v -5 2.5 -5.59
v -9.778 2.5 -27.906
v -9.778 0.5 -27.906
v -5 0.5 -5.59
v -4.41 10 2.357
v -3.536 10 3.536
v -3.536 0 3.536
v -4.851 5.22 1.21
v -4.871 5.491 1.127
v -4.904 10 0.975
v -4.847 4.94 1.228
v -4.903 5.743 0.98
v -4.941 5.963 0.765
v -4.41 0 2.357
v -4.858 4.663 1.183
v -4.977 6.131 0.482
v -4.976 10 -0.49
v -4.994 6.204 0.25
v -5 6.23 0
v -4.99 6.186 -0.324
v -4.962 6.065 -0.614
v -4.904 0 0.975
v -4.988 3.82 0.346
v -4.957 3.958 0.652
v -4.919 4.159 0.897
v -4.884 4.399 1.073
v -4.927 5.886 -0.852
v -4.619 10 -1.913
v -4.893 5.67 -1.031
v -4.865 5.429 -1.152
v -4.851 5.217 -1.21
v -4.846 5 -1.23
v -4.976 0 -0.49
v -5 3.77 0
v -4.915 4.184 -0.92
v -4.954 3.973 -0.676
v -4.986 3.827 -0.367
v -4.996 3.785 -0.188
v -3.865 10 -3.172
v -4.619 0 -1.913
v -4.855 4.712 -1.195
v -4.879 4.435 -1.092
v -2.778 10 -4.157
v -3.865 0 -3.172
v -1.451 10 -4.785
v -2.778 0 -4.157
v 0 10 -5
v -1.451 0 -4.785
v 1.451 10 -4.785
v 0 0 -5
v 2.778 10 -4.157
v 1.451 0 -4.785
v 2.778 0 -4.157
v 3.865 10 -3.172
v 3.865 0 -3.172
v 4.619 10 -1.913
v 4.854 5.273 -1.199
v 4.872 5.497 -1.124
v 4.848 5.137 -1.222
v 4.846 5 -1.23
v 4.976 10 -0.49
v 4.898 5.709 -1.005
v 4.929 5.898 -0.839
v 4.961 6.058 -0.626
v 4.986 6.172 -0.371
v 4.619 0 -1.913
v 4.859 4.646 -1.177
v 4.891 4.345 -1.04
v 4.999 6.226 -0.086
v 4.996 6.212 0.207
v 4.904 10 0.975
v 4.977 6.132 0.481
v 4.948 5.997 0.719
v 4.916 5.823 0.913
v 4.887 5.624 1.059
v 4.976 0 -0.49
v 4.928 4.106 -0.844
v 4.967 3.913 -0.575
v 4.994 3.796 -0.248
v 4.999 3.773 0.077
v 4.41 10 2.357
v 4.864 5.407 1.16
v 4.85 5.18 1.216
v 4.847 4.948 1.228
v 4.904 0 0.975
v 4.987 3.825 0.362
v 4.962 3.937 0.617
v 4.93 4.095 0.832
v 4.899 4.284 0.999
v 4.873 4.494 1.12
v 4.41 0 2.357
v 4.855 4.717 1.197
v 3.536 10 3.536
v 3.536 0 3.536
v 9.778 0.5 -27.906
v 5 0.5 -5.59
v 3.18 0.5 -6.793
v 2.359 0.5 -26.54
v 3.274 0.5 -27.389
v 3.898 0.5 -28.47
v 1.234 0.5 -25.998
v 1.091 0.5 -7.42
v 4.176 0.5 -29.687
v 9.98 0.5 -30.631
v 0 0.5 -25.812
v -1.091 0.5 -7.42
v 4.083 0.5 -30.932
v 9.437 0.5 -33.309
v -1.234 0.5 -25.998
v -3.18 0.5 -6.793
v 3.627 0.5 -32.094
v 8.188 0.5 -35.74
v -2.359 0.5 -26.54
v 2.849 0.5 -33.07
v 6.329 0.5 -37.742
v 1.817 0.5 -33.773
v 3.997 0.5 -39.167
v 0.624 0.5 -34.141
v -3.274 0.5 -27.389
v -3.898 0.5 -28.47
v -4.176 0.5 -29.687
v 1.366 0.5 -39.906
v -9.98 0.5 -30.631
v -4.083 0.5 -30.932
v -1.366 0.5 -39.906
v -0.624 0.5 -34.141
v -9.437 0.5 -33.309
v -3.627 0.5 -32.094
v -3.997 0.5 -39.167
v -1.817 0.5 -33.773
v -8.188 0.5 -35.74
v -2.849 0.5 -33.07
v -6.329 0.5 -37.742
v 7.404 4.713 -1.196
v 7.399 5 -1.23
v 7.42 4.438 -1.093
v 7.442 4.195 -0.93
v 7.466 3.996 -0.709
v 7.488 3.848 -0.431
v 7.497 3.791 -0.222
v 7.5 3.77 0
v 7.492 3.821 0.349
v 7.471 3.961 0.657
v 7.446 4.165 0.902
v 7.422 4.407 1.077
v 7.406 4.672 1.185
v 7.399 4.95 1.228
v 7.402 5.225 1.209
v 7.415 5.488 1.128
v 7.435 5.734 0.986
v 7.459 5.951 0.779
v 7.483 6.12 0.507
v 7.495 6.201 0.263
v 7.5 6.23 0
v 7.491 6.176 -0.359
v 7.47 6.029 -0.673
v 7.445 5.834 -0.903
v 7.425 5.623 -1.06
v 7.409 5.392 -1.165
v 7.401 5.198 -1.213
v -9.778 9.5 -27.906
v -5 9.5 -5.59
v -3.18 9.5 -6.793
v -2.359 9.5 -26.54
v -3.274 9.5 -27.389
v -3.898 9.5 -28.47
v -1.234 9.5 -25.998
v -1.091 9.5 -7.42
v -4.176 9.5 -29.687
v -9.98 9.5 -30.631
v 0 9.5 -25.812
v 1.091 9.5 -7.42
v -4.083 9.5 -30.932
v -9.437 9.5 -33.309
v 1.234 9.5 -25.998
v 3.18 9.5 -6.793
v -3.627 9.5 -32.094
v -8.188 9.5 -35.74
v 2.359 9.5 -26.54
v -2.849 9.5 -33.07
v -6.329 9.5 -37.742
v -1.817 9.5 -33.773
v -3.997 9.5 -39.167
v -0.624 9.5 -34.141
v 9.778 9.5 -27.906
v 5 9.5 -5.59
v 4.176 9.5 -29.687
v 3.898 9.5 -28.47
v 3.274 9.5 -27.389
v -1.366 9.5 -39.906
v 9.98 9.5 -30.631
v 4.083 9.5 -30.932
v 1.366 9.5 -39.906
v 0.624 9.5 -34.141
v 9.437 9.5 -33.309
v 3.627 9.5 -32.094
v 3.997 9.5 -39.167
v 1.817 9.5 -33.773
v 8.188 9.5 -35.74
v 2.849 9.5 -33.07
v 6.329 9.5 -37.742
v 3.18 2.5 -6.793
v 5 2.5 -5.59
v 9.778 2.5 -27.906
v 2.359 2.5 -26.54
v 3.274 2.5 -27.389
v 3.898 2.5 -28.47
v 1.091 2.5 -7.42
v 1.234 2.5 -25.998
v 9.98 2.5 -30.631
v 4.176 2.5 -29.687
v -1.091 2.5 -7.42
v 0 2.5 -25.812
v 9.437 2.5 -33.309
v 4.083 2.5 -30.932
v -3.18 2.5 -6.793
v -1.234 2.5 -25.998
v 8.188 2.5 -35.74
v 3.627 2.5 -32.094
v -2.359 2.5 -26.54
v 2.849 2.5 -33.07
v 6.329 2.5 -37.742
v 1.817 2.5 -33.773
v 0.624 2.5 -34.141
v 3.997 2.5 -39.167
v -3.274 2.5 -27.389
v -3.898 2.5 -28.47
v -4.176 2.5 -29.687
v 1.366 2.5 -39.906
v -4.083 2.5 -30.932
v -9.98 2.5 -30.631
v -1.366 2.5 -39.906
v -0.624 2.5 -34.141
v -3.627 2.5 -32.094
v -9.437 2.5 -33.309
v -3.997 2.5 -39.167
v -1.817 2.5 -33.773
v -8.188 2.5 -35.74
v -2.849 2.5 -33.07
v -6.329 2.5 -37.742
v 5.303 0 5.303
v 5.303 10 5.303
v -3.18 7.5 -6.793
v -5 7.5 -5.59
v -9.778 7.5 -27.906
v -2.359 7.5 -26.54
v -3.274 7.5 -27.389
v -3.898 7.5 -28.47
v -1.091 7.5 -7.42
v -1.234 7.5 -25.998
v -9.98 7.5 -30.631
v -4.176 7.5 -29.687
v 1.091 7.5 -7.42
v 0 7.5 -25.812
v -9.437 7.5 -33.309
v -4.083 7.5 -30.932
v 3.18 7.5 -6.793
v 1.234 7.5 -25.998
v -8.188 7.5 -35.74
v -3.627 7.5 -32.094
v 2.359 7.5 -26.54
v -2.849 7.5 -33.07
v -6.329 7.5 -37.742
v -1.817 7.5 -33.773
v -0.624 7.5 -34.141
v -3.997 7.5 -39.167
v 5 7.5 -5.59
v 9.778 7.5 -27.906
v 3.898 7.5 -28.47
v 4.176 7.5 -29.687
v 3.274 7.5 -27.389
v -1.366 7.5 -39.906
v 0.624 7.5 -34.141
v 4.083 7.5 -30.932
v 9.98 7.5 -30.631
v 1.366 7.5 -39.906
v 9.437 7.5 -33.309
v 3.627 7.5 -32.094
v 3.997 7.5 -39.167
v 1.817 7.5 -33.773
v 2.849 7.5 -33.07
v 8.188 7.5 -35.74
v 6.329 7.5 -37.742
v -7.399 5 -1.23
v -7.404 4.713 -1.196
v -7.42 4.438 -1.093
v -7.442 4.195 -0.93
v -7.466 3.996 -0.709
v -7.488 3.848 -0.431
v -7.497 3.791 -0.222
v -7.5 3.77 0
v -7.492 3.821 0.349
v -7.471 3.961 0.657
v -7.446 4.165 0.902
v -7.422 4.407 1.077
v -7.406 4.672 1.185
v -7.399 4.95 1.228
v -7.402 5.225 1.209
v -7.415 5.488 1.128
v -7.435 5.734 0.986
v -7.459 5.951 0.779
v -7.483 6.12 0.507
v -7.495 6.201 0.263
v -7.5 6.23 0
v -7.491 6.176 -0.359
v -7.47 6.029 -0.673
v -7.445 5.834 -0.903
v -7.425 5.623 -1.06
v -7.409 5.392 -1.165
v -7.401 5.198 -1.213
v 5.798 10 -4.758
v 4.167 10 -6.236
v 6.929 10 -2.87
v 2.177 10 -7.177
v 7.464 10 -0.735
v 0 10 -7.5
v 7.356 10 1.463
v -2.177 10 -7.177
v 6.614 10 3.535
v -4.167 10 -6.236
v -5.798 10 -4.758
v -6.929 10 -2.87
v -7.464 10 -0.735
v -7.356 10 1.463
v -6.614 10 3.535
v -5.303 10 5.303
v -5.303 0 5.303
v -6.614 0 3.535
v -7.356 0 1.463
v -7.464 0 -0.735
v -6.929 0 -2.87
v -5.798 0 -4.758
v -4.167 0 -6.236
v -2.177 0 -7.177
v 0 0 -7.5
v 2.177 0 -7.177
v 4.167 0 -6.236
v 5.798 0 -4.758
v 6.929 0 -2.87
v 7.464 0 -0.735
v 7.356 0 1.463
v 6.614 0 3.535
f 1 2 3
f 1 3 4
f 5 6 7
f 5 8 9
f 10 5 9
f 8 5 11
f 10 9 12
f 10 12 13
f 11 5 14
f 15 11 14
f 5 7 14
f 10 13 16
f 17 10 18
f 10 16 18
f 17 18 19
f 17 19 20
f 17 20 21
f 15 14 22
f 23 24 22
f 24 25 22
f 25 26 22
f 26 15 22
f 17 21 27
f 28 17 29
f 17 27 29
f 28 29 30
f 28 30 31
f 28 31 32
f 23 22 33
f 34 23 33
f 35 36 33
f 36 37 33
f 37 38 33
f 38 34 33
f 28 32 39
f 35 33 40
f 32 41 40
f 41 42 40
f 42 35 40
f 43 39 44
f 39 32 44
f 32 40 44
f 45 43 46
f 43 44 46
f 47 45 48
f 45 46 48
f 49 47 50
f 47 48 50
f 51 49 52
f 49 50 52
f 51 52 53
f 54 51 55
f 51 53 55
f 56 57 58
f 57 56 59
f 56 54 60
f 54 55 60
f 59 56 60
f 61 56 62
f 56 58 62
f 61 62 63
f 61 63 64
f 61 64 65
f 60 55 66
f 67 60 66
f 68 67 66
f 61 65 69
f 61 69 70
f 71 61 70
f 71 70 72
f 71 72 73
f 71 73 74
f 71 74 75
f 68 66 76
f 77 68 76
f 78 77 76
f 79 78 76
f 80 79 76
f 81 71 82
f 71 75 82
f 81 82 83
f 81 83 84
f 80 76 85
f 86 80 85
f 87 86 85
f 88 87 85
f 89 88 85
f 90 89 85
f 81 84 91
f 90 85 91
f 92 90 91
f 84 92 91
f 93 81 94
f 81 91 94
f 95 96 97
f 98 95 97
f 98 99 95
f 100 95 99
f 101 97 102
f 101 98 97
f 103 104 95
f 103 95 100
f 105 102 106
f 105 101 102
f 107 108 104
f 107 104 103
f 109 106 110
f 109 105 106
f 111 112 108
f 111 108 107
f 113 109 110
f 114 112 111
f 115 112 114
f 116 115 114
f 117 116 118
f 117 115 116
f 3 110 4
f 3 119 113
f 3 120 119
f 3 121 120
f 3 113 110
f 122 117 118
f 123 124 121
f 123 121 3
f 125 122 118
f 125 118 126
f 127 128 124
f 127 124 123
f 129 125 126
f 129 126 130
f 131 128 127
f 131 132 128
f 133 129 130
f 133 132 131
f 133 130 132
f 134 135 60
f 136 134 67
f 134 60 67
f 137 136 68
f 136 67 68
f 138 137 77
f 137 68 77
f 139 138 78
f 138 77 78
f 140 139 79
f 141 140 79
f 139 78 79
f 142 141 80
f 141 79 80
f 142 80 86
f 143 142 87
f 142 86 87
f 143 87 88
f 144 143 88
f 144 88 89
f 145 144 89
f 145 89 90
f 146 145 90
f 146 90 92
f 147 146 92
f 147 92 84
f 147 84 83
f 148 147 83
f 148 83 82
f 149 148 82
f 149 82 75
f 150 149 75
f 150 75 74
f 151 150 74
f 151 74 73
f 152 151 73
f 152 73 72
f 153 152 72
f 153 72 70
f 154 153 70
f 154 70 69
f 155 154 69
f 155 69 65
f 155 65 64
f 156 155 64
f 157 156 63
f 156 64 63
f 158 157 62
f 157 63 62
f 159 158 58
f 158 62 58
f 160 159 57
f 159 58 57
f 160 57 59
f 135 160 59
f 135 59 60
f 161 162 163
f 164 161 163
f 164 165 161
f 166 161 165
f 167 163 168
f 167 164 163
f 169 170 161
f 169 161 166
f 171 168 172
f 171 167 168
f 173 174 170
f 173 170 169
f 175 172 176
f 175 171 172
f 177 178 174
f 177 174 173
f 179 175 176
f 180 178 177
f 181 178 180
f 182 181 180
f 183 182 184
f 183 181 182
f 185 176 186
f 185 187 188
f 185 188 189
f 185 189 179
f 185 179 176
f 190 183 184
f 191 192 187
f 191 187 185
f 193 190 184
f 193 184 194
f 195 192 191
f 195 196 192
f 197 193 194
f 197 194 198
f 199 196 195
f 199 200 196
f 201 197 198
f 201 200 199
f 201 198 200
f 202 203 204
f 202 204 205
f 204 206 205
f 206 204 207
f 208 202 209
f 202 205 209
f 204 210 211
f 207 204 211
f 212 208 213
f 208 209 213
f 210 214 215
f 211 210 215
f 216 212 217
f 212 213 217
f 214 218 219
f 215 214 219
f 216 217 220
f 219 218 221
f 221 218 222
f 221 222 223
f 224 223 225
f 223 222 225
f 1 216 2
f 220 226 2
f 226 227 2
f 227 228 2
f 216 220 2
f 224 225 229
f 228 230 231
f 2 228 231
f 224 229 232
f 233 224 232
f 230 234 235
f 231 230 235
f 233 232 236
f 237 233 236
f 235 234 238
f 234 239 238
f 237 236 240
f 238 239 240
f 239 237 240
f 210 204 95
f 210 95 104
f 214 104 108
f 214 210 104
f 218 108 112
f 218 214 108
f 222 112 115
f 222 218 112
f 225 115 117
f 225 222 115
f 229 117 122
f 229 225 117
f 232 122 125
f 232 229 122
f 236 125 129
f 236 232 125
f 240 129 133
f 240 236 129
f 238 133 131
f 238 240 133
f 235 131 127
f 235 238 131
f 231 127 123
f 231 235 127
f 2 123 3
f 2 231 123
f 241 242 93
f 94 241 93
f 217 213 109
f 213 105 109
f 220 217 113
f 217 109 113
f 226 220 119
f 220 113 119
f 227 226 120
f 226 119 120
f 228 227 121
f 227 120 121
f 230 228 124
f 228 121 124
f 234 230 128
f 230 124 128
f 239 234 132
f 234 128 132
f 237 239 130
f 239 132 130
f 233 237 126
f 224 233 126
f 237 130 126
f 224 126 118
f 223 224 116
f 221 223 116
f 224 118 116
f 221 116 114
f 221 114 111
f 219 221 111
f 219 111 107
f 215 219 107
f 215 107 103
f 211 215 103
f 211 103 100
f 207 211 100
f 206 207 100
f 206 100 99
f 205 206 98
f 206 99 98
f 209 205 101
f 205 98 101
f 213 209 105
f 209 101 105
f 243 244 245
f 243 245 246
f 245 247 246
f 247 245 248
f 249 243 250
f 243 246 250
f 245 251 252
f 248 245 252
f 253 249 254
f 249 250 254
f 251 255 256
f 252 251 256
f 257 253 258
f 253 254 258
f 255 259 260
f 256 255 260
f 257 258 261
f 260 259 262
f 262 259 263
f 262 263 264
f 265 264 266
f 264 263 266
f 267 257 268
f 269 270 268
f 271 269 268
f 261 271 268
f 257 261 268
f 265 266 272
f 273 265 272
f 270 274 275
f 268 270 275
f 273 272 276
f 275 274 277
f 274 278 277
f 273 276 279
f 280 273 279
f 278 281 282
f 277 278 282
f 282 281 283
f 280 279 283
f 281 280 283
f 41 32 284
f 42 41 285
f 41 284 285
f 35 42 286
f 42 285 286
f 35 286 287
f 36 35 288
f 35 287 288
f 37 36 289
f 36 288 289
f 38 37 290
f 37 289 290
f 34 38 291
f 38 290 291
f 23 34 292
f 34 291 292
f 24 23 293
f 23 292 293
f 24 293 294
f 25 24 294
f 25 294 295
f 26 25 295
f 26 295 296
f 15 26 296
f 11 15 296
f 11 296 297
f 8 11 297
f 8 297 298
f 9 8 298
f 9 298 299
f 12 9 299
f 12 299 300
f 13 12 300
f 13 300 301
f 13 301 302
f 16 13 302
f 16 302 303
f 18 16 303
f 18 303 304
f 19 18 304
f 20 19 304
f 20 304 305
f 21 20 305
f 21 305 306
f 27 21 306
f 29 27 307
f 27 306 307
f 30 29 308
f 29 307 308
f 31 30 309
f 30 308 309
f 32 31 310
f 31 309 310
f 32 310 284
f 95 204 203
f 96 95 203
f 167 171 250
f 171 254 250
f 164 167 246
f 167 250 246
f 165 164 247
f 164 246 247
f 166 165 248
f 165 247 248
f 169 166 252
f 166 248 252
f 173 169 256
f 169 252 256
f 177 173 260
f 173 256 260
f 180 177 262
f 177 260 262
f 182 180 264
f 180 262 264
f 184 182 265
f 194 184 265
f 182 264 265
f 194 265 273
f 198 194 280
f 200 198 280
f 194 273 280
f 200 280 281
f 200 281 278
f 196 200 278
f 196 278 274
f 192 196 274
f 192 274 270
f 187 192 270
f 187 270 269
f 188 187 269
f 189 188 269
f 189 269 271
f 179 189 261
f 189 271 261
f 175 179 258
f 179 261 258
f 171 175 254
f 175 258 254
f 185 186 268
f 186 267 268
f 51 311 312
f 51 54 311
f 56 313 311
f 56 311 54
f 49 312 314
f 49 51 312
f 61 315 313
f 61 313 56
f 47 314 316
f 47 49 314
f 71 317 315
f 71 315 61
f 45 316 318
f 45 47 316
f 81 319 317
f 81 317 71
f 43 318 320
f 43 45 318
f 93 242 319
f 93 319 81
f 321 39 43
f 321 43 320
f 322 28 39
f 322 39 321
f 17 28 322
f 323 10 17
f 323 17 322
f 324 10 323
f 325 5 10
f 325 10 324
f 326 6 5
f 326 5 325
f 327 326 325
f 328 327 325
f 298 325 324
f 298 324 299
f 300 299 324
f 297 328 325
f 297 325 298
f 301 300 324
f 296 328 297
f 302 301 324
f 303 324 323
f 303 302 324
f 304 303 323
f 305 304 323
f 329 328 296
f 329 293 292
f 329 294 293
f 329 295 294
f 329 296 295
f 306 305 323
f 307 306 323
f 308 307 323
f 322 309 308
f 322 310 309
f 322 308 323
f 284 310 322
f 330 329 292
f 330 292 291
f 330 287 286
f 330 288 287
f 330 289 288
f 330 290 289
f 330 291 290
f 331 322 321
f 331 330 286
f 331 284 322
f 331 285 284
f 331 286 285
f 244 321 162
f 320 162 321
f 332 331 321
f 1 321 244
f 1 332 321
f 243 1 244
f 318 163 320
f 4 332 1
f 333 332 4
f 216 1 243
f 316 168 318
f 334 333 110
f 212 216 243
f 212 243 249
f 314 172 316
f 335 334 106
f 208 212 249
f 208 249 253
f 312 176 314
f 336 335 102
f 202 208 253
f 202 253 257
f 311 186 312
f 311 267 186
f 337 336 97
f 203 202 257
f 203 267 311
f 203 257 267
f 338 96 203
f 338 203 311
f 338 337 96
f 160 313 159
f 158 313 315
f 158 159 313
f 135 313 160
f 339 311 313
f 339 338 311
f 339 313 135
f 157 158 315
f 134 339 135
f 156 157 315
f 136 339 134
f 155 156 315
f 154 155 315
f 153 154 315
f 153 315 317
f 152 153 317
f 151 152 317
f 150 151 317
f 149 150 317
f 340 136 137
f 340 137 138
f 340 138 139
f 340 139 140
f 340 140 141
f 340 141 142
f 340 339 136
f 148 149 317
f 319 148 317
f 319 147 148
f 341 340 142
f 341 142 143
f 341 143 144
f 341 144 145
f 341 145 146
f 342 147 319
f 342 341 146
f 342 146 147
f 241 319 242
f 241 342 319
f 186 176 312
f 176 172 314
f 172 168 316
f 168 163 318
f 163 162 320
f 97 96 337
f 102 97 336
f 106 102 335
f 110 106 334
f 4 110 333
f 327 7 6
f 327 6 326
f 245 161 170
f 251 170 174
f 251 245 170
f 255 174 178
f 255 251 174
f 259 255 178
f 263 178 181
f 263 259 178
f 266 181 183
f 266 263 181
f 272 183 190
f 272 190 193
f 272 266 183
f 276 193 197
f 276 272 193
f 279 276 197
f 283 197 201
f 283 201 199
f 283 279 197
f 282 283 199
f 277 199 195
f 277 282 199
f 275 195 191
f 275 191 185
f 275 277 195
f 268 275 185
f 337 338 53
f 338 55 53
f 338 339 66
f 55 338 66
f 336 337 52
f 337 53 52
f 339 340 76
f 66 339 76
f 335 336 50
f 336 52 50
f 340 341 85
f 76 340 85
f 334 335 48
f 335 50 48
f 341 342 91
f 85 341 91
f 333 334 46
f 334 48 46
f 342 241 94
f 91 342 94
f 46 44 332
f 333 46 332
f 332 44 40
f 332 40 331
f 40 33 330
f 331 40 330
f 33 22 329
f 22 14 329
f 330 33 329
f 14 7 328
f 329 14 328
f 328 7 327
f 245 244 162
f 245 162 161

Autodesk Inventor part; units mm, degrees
sketch "Sketch1" plane through (0, 0, 0) normal (0, 1, 0) x (-1, 0, 0)
  circle A0 centre (0, 0) radius 5
  circle A1 centre (0, 0) radius 7.5
  dimension "d0" = 10
  dimension "d1" = 15
extrude "Extrusion1" add sketch "Sketch1" along normal blind 10
ref_plane "Work Plane1" through (0, 7.5, 0) normal (0, 1, 0) x (1, 0, 0)
sketch "Sketch2" plane through (0, 7.5, 0) normal (0, 1, 0) x (1, 0, 0)
  line L0 (-5, 5.5902) -> (-5, 15)
  line L1 (-5, 15) -> (5, 15)
  line L2 (5, 15) -> (5, 5.5902)
  circle A0 centre (0, 0) radius 7.5 projected
  circle A1 centre (0, 0) radius 7.5 projected
  dimension "d5" = 10
  dimension "d6" = 5
  dimension "d7" = 15
extrude "Extrusion2" add sketch "Sketch2" along normal blind 2 contours L0 L1 L2 A0
ref_plane "Work Plane2" through (0, 5, 0) normal (0, -1, 0) x (1, 0, 0)
sketch "Sketch4" plane through (0, 7.5, 0) normal (0, -1, 0) x (1, 0, 0)
  circle A0 centre (0, -30) radius 10
  line L0 (5, -5.5902) -> (5, -15) projected
  line L1 (-5, -15) -> (-5, -5.5902) projected
  line L2 (-5, -5.5902) -> (-9.7784, -27.9062)
  line L3 (5, -5.5902) -> (9.7784, -27.9062)
  line L4 (5, -15) -> (-5, -15) projected
  point P0 (0, 0)
  dimension "d11" = 20
  dimension "d26" = 30
sketch "Sketch5" plane through (0, 10, 0) normal (0, 1, 0) x (1, 0, 0)
  line L0 (0, 0) -> (-8, -8)
  line L1 (-8, -8) -> (8, -8)
  line L2 (8, -8) -> (0, 0)
  line L3 (-13.7421, 0) -> (14.2579, 0) projected
  dimension "d12" = 8
  dimension "d13" = 45
  dimension "d14" = 45
extrude "Extrusion3" cut sketch "Sketch5" against normal blind 10
ref_plane "Work Plane3" through (7.5, 0, 0) normal (1, 0, 0) x (0, 1, 0)
sketch "Sketch6" plane through (7.5, 0, 0) normal (1, 0, 0) x (0, 1, 0)
  point P0 (0, 0)
  point P1 (5, 0)
  dimension "d18" = 5
hole "Hole1" at (7.5, 5, 0) direction (-1, 0, 0) diameter 2.459 end through all thread size "M3x0.5" class "6H" standard "ISO Metric profile"
extrude "Extrusion4" add sketch "Sketch4" against normal blind 2
ref_plane "Work Plane5" through (0, 5, 0) normal (0, -1, 0) x (1, 0, 0)
mirror "Mirror2" about plane through (0, 5, 0) normal (0, -1, 0) of "Extrusion2", "Extrusion4"
sketch "Sketch7" plane through (0, 9.5, 0) normal (0, 1, 0) x (1, 0, 0)
  arc A0 (9.7784, 27.9062) -> (-9.7784, 27.9062) centre (0, 30) ccw projected
  point P0 (0, 0)
hole "Hole2" at (0, 9.5, -30) direction (0, -1, 0) diameter 8.376 end through all thread size "M10x1.5" class "6H" standard "ISO Metric profile"
properties part number "KEP_BUT" material "Nickel-Copper Alloy 400"
